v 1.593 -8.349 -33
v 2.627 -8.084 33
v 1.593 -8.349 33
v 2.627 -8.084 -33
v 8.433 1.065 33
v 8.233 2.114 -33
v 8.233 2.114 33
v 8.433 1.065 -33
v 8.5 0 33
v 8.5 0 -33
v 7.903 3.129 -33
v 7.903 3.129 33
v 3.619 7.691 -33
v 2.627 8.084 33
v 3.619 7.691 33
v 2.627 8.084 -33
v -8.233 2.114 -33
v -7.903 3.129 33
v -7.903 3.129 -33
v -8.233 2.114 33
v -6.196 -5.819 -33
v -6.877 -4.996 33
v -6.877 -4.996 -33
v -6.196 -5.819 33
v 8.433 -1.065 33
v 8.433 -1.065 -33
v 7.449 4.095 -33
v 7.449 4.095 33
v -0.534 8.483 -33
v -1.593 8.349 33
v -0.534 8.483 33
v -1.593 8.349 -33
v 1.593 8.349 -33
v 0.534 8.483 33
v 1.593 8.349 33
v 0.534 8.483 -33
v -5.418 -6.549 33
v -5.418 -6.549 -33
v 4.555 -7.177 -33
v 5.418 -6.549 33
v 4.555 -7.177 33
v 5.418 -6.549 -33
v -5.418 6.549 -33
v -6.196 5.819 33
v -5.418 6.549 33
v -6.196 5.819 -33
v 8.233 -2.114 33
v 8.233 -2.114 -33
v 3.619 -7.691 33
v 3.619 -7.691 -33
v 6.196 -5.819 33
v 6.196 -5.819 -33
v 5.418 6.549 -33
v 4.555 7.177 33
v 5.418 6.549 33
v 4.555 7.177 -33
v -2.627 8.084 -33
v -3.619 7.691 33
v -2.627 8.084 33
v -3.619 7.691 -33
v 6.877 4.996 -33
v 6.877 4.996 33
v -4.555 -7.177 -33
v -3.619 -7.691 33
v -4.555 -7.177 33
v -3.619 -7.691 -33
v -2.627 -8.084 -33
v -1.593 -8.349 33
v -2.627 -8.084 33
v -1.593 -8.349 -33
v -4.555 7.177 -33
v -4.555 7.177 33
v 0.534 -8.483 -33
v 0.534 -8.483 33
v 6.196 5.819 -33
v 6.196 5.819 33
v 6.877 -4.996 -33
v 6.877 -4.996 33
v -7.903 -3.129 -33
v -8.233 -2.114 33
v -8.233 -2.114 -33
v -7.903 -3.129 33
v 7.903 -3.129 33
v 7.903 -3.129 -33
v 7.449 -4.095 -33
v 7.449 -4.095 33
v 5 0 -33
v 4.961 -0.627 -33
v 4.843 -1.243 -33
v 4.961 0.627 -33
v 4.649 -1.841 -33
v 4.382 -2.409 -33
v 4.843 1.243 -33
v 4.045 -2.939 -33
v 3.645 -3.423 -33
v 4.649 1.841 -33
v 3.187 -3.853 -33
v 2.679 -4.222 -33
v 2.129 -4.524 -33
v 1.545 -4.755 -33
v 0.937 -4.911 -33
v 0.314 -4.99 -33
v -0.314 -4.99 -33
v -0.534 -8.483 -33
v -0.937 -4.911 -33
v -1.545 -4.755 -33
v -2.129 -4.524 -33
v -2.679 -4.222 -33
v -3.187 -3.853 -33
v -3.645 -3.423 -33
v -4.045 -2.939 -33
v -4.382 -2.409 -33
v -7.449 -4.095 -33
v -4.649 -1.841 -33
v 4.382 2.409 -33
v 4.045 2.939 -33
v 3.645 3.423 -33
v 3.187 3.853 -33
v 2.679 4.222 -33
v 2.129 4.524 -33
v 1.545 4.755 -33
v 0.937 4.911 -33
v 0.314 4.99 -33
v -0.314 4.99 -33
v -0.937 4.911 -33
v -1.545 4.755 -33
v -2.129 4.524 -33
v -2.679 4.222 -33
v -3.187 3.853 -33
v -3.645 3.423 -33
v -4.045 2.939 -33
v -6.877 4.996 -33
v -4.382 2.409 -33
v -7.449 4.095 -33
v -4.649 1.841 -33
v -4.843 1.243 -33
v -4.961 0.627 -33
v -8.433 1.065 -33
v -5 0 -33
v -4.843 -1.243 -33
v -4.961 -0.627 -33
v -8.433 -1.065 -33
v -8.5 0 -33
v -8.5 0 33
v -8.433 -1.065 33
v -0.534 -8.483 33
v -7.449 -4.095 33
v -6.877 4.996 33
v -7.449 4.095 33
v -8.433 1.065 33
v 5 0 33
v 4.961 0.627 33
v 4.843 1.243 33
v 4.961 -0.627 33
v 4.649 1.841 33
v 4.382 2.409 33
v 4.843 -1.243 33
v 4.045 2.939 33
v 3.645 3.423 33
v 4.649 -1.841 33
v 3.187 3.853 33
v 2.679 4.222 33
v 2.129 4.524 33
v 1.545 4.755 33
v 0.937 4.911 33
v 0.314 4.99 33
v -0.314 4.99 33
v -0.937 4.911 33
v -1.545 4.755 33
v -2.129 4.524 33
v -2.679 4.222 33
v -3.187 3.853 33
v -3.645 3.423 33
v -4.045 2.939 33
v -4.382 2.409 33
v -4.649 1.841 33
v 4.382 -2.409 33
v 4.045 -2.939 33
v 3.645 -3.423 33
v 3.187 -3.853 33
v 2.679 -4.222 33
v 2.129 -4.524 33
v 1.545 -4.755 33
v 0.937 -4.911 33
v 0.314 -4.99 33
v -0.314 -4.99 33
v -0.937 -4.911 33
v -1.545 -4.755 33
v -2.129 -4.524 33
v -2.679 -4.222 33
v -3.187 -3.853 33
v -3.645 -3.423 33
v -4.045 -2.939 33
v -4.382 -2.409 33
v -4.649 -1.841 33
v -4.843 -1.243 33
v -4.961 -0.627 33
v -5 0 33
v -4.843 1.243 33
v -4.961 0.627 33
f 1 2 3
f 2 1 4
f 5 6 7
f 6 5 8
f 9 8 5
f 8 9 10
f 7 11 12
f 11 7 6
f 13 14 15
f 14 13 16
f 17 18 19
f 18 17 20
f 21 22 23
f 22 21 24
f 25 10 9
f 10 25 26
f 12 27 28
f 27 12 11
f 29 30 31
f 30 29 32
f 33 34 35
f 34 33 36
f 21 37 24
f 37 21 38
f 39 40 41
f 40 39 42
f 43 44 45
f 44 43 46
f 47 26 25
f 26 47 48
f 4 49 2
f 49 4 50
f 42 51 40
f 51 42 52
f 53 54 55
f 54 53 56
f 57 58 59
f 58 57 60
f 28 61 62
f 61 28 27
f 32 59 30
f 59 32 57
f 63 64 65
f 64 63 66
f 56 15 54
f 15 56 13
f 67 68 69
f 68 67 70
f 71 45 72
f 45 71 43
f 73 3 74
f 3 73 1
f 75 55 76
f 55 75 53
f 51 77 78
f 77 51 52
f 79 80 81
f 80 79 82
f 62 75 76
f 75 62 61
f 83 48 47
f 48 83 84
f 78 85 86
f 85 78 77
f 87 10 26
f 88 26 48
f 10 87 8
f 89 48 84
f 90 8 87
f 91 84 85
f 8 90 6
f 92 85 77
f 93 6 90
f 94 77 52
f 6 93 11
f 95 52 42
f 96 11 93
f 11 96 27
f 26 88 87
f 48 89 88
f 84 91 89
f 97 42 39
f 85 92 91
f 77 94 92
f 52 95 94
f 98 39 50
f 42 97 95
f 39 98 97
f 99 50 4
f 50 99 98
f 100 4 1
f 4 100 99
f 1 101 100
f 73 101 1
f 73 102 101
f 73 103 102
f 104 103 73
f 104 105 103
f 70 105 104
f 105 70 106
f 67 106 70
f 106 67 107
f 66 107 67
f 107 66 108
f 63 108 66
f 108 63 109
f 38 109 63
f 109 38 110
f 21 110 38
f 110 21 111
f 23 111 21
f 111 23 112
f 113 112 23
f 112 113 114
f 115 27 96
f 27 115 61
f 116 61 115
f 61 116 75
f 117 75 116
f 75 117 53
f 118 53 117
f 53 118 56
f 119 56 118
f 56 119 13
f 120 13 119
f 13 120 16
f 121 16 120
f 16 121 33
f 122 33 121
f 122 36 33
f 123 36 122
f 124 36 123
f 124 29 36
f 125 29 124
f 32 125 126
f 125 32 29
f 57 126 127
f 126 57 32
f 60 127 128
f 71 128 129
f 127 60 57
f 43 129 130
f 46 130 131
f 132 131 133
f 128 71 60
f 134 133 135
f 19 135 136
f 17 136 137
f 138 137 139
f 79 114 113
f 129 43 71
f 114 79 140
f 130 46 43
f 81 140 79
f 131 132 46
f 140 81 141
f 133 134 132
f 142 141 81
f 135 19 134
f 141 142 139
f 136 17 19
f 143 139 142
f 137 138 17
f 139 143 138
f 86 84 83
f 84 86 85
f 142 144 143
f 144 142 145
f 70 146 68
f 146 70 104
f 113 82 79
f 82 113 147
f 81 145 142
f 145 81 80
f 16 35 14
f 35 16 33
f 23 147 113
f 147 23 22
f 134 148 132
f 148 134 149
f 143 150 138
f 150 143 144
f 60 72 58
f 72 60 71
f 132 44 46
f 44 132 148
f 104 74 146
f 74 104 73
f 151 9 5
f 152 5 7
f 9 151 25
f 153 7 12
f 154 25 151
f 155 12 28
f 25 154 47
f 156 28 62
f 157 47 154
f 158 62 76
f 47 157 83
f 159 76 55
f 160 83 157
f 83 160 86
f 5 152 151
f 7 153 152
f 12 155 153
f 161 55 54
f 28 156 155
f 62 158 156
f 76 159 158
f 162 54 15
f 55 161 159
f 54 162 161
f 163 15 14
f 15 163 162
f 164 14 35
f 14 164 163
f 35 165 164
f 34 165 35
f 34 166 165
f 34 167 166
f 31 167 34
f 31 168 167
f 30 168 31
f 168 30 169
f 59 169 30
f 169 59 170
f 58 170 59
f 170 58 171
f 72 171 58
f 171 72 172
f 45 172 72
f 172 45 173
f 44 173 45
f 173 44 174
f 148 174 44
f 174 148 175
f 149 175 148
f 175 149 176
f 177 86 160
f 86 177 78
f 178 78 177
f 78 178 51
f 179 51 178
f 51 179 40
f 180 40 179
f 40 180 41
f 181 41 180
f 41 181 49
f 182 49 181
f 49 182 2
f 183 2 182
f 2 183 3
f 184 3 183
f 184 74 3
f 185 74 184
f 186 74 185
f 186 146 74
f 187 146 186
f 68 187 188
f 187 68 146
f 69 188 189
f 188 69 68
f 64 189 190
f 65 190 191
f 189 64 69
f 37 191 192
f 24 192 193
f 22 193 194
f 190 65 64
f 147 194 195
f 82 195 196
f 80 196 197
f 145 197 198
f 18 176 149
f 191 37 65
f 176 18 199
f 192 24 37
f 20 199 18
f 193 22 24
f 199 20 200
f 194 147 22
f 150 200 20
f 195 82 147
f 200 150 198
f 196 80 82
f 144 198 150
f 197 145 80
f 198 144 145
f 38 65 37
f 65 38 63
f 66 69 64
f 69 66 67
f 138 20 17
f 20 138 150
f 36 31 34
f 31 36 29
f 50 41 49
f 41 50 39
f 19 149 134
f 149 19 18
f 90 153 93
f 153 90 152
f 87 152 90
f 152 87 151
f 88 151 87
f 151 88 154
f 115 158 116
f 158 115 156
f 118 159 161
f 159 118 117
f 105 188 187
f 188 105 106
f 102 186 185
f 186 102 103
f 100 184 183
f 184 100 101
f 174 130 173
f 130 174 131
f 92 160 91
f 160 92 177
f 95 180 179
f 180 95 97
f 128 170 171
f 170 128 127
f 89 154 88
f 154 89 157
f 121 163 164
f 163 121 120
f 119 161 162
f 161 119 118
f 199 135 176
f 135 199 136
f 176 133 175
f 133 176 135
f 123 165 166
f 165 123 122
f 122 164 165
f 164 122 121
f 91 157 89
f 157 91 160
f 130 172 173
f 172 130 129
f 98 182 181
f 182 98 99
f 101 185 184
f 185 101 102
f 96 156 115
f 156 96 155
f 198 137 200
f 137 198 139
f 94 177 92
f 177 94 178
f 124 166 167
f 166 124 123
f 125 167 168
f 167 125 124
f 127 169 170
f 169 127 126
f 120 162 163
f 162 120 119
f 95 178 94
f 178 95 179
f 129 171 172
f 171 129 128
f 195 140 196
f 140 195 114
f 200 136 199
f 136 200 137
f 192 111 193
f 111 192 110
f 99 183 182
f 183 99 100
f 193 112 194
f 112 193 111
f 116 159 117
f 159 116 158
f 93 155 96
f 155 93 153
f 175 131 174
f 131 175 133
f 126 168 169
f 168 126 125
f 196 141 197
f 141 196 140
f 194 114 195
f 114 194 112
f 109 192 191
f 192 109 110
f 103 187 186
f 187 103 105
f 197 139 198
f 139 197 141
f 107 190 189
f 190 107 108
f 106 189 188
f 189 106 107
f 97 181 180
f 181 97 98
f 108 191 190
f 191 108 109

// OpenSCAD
$fn = 50;


difference() {
	union() {
		translate(v = [0, 0, -33.0000000000]) {
			cylinder(h = 66, r = 8.5000000000);
		}
	}
	union() {
		translate(v = [0, 0, -100.0000000000]) {
			cylinder(h = 200, r = 5.0000000000);
		}
	}
}
